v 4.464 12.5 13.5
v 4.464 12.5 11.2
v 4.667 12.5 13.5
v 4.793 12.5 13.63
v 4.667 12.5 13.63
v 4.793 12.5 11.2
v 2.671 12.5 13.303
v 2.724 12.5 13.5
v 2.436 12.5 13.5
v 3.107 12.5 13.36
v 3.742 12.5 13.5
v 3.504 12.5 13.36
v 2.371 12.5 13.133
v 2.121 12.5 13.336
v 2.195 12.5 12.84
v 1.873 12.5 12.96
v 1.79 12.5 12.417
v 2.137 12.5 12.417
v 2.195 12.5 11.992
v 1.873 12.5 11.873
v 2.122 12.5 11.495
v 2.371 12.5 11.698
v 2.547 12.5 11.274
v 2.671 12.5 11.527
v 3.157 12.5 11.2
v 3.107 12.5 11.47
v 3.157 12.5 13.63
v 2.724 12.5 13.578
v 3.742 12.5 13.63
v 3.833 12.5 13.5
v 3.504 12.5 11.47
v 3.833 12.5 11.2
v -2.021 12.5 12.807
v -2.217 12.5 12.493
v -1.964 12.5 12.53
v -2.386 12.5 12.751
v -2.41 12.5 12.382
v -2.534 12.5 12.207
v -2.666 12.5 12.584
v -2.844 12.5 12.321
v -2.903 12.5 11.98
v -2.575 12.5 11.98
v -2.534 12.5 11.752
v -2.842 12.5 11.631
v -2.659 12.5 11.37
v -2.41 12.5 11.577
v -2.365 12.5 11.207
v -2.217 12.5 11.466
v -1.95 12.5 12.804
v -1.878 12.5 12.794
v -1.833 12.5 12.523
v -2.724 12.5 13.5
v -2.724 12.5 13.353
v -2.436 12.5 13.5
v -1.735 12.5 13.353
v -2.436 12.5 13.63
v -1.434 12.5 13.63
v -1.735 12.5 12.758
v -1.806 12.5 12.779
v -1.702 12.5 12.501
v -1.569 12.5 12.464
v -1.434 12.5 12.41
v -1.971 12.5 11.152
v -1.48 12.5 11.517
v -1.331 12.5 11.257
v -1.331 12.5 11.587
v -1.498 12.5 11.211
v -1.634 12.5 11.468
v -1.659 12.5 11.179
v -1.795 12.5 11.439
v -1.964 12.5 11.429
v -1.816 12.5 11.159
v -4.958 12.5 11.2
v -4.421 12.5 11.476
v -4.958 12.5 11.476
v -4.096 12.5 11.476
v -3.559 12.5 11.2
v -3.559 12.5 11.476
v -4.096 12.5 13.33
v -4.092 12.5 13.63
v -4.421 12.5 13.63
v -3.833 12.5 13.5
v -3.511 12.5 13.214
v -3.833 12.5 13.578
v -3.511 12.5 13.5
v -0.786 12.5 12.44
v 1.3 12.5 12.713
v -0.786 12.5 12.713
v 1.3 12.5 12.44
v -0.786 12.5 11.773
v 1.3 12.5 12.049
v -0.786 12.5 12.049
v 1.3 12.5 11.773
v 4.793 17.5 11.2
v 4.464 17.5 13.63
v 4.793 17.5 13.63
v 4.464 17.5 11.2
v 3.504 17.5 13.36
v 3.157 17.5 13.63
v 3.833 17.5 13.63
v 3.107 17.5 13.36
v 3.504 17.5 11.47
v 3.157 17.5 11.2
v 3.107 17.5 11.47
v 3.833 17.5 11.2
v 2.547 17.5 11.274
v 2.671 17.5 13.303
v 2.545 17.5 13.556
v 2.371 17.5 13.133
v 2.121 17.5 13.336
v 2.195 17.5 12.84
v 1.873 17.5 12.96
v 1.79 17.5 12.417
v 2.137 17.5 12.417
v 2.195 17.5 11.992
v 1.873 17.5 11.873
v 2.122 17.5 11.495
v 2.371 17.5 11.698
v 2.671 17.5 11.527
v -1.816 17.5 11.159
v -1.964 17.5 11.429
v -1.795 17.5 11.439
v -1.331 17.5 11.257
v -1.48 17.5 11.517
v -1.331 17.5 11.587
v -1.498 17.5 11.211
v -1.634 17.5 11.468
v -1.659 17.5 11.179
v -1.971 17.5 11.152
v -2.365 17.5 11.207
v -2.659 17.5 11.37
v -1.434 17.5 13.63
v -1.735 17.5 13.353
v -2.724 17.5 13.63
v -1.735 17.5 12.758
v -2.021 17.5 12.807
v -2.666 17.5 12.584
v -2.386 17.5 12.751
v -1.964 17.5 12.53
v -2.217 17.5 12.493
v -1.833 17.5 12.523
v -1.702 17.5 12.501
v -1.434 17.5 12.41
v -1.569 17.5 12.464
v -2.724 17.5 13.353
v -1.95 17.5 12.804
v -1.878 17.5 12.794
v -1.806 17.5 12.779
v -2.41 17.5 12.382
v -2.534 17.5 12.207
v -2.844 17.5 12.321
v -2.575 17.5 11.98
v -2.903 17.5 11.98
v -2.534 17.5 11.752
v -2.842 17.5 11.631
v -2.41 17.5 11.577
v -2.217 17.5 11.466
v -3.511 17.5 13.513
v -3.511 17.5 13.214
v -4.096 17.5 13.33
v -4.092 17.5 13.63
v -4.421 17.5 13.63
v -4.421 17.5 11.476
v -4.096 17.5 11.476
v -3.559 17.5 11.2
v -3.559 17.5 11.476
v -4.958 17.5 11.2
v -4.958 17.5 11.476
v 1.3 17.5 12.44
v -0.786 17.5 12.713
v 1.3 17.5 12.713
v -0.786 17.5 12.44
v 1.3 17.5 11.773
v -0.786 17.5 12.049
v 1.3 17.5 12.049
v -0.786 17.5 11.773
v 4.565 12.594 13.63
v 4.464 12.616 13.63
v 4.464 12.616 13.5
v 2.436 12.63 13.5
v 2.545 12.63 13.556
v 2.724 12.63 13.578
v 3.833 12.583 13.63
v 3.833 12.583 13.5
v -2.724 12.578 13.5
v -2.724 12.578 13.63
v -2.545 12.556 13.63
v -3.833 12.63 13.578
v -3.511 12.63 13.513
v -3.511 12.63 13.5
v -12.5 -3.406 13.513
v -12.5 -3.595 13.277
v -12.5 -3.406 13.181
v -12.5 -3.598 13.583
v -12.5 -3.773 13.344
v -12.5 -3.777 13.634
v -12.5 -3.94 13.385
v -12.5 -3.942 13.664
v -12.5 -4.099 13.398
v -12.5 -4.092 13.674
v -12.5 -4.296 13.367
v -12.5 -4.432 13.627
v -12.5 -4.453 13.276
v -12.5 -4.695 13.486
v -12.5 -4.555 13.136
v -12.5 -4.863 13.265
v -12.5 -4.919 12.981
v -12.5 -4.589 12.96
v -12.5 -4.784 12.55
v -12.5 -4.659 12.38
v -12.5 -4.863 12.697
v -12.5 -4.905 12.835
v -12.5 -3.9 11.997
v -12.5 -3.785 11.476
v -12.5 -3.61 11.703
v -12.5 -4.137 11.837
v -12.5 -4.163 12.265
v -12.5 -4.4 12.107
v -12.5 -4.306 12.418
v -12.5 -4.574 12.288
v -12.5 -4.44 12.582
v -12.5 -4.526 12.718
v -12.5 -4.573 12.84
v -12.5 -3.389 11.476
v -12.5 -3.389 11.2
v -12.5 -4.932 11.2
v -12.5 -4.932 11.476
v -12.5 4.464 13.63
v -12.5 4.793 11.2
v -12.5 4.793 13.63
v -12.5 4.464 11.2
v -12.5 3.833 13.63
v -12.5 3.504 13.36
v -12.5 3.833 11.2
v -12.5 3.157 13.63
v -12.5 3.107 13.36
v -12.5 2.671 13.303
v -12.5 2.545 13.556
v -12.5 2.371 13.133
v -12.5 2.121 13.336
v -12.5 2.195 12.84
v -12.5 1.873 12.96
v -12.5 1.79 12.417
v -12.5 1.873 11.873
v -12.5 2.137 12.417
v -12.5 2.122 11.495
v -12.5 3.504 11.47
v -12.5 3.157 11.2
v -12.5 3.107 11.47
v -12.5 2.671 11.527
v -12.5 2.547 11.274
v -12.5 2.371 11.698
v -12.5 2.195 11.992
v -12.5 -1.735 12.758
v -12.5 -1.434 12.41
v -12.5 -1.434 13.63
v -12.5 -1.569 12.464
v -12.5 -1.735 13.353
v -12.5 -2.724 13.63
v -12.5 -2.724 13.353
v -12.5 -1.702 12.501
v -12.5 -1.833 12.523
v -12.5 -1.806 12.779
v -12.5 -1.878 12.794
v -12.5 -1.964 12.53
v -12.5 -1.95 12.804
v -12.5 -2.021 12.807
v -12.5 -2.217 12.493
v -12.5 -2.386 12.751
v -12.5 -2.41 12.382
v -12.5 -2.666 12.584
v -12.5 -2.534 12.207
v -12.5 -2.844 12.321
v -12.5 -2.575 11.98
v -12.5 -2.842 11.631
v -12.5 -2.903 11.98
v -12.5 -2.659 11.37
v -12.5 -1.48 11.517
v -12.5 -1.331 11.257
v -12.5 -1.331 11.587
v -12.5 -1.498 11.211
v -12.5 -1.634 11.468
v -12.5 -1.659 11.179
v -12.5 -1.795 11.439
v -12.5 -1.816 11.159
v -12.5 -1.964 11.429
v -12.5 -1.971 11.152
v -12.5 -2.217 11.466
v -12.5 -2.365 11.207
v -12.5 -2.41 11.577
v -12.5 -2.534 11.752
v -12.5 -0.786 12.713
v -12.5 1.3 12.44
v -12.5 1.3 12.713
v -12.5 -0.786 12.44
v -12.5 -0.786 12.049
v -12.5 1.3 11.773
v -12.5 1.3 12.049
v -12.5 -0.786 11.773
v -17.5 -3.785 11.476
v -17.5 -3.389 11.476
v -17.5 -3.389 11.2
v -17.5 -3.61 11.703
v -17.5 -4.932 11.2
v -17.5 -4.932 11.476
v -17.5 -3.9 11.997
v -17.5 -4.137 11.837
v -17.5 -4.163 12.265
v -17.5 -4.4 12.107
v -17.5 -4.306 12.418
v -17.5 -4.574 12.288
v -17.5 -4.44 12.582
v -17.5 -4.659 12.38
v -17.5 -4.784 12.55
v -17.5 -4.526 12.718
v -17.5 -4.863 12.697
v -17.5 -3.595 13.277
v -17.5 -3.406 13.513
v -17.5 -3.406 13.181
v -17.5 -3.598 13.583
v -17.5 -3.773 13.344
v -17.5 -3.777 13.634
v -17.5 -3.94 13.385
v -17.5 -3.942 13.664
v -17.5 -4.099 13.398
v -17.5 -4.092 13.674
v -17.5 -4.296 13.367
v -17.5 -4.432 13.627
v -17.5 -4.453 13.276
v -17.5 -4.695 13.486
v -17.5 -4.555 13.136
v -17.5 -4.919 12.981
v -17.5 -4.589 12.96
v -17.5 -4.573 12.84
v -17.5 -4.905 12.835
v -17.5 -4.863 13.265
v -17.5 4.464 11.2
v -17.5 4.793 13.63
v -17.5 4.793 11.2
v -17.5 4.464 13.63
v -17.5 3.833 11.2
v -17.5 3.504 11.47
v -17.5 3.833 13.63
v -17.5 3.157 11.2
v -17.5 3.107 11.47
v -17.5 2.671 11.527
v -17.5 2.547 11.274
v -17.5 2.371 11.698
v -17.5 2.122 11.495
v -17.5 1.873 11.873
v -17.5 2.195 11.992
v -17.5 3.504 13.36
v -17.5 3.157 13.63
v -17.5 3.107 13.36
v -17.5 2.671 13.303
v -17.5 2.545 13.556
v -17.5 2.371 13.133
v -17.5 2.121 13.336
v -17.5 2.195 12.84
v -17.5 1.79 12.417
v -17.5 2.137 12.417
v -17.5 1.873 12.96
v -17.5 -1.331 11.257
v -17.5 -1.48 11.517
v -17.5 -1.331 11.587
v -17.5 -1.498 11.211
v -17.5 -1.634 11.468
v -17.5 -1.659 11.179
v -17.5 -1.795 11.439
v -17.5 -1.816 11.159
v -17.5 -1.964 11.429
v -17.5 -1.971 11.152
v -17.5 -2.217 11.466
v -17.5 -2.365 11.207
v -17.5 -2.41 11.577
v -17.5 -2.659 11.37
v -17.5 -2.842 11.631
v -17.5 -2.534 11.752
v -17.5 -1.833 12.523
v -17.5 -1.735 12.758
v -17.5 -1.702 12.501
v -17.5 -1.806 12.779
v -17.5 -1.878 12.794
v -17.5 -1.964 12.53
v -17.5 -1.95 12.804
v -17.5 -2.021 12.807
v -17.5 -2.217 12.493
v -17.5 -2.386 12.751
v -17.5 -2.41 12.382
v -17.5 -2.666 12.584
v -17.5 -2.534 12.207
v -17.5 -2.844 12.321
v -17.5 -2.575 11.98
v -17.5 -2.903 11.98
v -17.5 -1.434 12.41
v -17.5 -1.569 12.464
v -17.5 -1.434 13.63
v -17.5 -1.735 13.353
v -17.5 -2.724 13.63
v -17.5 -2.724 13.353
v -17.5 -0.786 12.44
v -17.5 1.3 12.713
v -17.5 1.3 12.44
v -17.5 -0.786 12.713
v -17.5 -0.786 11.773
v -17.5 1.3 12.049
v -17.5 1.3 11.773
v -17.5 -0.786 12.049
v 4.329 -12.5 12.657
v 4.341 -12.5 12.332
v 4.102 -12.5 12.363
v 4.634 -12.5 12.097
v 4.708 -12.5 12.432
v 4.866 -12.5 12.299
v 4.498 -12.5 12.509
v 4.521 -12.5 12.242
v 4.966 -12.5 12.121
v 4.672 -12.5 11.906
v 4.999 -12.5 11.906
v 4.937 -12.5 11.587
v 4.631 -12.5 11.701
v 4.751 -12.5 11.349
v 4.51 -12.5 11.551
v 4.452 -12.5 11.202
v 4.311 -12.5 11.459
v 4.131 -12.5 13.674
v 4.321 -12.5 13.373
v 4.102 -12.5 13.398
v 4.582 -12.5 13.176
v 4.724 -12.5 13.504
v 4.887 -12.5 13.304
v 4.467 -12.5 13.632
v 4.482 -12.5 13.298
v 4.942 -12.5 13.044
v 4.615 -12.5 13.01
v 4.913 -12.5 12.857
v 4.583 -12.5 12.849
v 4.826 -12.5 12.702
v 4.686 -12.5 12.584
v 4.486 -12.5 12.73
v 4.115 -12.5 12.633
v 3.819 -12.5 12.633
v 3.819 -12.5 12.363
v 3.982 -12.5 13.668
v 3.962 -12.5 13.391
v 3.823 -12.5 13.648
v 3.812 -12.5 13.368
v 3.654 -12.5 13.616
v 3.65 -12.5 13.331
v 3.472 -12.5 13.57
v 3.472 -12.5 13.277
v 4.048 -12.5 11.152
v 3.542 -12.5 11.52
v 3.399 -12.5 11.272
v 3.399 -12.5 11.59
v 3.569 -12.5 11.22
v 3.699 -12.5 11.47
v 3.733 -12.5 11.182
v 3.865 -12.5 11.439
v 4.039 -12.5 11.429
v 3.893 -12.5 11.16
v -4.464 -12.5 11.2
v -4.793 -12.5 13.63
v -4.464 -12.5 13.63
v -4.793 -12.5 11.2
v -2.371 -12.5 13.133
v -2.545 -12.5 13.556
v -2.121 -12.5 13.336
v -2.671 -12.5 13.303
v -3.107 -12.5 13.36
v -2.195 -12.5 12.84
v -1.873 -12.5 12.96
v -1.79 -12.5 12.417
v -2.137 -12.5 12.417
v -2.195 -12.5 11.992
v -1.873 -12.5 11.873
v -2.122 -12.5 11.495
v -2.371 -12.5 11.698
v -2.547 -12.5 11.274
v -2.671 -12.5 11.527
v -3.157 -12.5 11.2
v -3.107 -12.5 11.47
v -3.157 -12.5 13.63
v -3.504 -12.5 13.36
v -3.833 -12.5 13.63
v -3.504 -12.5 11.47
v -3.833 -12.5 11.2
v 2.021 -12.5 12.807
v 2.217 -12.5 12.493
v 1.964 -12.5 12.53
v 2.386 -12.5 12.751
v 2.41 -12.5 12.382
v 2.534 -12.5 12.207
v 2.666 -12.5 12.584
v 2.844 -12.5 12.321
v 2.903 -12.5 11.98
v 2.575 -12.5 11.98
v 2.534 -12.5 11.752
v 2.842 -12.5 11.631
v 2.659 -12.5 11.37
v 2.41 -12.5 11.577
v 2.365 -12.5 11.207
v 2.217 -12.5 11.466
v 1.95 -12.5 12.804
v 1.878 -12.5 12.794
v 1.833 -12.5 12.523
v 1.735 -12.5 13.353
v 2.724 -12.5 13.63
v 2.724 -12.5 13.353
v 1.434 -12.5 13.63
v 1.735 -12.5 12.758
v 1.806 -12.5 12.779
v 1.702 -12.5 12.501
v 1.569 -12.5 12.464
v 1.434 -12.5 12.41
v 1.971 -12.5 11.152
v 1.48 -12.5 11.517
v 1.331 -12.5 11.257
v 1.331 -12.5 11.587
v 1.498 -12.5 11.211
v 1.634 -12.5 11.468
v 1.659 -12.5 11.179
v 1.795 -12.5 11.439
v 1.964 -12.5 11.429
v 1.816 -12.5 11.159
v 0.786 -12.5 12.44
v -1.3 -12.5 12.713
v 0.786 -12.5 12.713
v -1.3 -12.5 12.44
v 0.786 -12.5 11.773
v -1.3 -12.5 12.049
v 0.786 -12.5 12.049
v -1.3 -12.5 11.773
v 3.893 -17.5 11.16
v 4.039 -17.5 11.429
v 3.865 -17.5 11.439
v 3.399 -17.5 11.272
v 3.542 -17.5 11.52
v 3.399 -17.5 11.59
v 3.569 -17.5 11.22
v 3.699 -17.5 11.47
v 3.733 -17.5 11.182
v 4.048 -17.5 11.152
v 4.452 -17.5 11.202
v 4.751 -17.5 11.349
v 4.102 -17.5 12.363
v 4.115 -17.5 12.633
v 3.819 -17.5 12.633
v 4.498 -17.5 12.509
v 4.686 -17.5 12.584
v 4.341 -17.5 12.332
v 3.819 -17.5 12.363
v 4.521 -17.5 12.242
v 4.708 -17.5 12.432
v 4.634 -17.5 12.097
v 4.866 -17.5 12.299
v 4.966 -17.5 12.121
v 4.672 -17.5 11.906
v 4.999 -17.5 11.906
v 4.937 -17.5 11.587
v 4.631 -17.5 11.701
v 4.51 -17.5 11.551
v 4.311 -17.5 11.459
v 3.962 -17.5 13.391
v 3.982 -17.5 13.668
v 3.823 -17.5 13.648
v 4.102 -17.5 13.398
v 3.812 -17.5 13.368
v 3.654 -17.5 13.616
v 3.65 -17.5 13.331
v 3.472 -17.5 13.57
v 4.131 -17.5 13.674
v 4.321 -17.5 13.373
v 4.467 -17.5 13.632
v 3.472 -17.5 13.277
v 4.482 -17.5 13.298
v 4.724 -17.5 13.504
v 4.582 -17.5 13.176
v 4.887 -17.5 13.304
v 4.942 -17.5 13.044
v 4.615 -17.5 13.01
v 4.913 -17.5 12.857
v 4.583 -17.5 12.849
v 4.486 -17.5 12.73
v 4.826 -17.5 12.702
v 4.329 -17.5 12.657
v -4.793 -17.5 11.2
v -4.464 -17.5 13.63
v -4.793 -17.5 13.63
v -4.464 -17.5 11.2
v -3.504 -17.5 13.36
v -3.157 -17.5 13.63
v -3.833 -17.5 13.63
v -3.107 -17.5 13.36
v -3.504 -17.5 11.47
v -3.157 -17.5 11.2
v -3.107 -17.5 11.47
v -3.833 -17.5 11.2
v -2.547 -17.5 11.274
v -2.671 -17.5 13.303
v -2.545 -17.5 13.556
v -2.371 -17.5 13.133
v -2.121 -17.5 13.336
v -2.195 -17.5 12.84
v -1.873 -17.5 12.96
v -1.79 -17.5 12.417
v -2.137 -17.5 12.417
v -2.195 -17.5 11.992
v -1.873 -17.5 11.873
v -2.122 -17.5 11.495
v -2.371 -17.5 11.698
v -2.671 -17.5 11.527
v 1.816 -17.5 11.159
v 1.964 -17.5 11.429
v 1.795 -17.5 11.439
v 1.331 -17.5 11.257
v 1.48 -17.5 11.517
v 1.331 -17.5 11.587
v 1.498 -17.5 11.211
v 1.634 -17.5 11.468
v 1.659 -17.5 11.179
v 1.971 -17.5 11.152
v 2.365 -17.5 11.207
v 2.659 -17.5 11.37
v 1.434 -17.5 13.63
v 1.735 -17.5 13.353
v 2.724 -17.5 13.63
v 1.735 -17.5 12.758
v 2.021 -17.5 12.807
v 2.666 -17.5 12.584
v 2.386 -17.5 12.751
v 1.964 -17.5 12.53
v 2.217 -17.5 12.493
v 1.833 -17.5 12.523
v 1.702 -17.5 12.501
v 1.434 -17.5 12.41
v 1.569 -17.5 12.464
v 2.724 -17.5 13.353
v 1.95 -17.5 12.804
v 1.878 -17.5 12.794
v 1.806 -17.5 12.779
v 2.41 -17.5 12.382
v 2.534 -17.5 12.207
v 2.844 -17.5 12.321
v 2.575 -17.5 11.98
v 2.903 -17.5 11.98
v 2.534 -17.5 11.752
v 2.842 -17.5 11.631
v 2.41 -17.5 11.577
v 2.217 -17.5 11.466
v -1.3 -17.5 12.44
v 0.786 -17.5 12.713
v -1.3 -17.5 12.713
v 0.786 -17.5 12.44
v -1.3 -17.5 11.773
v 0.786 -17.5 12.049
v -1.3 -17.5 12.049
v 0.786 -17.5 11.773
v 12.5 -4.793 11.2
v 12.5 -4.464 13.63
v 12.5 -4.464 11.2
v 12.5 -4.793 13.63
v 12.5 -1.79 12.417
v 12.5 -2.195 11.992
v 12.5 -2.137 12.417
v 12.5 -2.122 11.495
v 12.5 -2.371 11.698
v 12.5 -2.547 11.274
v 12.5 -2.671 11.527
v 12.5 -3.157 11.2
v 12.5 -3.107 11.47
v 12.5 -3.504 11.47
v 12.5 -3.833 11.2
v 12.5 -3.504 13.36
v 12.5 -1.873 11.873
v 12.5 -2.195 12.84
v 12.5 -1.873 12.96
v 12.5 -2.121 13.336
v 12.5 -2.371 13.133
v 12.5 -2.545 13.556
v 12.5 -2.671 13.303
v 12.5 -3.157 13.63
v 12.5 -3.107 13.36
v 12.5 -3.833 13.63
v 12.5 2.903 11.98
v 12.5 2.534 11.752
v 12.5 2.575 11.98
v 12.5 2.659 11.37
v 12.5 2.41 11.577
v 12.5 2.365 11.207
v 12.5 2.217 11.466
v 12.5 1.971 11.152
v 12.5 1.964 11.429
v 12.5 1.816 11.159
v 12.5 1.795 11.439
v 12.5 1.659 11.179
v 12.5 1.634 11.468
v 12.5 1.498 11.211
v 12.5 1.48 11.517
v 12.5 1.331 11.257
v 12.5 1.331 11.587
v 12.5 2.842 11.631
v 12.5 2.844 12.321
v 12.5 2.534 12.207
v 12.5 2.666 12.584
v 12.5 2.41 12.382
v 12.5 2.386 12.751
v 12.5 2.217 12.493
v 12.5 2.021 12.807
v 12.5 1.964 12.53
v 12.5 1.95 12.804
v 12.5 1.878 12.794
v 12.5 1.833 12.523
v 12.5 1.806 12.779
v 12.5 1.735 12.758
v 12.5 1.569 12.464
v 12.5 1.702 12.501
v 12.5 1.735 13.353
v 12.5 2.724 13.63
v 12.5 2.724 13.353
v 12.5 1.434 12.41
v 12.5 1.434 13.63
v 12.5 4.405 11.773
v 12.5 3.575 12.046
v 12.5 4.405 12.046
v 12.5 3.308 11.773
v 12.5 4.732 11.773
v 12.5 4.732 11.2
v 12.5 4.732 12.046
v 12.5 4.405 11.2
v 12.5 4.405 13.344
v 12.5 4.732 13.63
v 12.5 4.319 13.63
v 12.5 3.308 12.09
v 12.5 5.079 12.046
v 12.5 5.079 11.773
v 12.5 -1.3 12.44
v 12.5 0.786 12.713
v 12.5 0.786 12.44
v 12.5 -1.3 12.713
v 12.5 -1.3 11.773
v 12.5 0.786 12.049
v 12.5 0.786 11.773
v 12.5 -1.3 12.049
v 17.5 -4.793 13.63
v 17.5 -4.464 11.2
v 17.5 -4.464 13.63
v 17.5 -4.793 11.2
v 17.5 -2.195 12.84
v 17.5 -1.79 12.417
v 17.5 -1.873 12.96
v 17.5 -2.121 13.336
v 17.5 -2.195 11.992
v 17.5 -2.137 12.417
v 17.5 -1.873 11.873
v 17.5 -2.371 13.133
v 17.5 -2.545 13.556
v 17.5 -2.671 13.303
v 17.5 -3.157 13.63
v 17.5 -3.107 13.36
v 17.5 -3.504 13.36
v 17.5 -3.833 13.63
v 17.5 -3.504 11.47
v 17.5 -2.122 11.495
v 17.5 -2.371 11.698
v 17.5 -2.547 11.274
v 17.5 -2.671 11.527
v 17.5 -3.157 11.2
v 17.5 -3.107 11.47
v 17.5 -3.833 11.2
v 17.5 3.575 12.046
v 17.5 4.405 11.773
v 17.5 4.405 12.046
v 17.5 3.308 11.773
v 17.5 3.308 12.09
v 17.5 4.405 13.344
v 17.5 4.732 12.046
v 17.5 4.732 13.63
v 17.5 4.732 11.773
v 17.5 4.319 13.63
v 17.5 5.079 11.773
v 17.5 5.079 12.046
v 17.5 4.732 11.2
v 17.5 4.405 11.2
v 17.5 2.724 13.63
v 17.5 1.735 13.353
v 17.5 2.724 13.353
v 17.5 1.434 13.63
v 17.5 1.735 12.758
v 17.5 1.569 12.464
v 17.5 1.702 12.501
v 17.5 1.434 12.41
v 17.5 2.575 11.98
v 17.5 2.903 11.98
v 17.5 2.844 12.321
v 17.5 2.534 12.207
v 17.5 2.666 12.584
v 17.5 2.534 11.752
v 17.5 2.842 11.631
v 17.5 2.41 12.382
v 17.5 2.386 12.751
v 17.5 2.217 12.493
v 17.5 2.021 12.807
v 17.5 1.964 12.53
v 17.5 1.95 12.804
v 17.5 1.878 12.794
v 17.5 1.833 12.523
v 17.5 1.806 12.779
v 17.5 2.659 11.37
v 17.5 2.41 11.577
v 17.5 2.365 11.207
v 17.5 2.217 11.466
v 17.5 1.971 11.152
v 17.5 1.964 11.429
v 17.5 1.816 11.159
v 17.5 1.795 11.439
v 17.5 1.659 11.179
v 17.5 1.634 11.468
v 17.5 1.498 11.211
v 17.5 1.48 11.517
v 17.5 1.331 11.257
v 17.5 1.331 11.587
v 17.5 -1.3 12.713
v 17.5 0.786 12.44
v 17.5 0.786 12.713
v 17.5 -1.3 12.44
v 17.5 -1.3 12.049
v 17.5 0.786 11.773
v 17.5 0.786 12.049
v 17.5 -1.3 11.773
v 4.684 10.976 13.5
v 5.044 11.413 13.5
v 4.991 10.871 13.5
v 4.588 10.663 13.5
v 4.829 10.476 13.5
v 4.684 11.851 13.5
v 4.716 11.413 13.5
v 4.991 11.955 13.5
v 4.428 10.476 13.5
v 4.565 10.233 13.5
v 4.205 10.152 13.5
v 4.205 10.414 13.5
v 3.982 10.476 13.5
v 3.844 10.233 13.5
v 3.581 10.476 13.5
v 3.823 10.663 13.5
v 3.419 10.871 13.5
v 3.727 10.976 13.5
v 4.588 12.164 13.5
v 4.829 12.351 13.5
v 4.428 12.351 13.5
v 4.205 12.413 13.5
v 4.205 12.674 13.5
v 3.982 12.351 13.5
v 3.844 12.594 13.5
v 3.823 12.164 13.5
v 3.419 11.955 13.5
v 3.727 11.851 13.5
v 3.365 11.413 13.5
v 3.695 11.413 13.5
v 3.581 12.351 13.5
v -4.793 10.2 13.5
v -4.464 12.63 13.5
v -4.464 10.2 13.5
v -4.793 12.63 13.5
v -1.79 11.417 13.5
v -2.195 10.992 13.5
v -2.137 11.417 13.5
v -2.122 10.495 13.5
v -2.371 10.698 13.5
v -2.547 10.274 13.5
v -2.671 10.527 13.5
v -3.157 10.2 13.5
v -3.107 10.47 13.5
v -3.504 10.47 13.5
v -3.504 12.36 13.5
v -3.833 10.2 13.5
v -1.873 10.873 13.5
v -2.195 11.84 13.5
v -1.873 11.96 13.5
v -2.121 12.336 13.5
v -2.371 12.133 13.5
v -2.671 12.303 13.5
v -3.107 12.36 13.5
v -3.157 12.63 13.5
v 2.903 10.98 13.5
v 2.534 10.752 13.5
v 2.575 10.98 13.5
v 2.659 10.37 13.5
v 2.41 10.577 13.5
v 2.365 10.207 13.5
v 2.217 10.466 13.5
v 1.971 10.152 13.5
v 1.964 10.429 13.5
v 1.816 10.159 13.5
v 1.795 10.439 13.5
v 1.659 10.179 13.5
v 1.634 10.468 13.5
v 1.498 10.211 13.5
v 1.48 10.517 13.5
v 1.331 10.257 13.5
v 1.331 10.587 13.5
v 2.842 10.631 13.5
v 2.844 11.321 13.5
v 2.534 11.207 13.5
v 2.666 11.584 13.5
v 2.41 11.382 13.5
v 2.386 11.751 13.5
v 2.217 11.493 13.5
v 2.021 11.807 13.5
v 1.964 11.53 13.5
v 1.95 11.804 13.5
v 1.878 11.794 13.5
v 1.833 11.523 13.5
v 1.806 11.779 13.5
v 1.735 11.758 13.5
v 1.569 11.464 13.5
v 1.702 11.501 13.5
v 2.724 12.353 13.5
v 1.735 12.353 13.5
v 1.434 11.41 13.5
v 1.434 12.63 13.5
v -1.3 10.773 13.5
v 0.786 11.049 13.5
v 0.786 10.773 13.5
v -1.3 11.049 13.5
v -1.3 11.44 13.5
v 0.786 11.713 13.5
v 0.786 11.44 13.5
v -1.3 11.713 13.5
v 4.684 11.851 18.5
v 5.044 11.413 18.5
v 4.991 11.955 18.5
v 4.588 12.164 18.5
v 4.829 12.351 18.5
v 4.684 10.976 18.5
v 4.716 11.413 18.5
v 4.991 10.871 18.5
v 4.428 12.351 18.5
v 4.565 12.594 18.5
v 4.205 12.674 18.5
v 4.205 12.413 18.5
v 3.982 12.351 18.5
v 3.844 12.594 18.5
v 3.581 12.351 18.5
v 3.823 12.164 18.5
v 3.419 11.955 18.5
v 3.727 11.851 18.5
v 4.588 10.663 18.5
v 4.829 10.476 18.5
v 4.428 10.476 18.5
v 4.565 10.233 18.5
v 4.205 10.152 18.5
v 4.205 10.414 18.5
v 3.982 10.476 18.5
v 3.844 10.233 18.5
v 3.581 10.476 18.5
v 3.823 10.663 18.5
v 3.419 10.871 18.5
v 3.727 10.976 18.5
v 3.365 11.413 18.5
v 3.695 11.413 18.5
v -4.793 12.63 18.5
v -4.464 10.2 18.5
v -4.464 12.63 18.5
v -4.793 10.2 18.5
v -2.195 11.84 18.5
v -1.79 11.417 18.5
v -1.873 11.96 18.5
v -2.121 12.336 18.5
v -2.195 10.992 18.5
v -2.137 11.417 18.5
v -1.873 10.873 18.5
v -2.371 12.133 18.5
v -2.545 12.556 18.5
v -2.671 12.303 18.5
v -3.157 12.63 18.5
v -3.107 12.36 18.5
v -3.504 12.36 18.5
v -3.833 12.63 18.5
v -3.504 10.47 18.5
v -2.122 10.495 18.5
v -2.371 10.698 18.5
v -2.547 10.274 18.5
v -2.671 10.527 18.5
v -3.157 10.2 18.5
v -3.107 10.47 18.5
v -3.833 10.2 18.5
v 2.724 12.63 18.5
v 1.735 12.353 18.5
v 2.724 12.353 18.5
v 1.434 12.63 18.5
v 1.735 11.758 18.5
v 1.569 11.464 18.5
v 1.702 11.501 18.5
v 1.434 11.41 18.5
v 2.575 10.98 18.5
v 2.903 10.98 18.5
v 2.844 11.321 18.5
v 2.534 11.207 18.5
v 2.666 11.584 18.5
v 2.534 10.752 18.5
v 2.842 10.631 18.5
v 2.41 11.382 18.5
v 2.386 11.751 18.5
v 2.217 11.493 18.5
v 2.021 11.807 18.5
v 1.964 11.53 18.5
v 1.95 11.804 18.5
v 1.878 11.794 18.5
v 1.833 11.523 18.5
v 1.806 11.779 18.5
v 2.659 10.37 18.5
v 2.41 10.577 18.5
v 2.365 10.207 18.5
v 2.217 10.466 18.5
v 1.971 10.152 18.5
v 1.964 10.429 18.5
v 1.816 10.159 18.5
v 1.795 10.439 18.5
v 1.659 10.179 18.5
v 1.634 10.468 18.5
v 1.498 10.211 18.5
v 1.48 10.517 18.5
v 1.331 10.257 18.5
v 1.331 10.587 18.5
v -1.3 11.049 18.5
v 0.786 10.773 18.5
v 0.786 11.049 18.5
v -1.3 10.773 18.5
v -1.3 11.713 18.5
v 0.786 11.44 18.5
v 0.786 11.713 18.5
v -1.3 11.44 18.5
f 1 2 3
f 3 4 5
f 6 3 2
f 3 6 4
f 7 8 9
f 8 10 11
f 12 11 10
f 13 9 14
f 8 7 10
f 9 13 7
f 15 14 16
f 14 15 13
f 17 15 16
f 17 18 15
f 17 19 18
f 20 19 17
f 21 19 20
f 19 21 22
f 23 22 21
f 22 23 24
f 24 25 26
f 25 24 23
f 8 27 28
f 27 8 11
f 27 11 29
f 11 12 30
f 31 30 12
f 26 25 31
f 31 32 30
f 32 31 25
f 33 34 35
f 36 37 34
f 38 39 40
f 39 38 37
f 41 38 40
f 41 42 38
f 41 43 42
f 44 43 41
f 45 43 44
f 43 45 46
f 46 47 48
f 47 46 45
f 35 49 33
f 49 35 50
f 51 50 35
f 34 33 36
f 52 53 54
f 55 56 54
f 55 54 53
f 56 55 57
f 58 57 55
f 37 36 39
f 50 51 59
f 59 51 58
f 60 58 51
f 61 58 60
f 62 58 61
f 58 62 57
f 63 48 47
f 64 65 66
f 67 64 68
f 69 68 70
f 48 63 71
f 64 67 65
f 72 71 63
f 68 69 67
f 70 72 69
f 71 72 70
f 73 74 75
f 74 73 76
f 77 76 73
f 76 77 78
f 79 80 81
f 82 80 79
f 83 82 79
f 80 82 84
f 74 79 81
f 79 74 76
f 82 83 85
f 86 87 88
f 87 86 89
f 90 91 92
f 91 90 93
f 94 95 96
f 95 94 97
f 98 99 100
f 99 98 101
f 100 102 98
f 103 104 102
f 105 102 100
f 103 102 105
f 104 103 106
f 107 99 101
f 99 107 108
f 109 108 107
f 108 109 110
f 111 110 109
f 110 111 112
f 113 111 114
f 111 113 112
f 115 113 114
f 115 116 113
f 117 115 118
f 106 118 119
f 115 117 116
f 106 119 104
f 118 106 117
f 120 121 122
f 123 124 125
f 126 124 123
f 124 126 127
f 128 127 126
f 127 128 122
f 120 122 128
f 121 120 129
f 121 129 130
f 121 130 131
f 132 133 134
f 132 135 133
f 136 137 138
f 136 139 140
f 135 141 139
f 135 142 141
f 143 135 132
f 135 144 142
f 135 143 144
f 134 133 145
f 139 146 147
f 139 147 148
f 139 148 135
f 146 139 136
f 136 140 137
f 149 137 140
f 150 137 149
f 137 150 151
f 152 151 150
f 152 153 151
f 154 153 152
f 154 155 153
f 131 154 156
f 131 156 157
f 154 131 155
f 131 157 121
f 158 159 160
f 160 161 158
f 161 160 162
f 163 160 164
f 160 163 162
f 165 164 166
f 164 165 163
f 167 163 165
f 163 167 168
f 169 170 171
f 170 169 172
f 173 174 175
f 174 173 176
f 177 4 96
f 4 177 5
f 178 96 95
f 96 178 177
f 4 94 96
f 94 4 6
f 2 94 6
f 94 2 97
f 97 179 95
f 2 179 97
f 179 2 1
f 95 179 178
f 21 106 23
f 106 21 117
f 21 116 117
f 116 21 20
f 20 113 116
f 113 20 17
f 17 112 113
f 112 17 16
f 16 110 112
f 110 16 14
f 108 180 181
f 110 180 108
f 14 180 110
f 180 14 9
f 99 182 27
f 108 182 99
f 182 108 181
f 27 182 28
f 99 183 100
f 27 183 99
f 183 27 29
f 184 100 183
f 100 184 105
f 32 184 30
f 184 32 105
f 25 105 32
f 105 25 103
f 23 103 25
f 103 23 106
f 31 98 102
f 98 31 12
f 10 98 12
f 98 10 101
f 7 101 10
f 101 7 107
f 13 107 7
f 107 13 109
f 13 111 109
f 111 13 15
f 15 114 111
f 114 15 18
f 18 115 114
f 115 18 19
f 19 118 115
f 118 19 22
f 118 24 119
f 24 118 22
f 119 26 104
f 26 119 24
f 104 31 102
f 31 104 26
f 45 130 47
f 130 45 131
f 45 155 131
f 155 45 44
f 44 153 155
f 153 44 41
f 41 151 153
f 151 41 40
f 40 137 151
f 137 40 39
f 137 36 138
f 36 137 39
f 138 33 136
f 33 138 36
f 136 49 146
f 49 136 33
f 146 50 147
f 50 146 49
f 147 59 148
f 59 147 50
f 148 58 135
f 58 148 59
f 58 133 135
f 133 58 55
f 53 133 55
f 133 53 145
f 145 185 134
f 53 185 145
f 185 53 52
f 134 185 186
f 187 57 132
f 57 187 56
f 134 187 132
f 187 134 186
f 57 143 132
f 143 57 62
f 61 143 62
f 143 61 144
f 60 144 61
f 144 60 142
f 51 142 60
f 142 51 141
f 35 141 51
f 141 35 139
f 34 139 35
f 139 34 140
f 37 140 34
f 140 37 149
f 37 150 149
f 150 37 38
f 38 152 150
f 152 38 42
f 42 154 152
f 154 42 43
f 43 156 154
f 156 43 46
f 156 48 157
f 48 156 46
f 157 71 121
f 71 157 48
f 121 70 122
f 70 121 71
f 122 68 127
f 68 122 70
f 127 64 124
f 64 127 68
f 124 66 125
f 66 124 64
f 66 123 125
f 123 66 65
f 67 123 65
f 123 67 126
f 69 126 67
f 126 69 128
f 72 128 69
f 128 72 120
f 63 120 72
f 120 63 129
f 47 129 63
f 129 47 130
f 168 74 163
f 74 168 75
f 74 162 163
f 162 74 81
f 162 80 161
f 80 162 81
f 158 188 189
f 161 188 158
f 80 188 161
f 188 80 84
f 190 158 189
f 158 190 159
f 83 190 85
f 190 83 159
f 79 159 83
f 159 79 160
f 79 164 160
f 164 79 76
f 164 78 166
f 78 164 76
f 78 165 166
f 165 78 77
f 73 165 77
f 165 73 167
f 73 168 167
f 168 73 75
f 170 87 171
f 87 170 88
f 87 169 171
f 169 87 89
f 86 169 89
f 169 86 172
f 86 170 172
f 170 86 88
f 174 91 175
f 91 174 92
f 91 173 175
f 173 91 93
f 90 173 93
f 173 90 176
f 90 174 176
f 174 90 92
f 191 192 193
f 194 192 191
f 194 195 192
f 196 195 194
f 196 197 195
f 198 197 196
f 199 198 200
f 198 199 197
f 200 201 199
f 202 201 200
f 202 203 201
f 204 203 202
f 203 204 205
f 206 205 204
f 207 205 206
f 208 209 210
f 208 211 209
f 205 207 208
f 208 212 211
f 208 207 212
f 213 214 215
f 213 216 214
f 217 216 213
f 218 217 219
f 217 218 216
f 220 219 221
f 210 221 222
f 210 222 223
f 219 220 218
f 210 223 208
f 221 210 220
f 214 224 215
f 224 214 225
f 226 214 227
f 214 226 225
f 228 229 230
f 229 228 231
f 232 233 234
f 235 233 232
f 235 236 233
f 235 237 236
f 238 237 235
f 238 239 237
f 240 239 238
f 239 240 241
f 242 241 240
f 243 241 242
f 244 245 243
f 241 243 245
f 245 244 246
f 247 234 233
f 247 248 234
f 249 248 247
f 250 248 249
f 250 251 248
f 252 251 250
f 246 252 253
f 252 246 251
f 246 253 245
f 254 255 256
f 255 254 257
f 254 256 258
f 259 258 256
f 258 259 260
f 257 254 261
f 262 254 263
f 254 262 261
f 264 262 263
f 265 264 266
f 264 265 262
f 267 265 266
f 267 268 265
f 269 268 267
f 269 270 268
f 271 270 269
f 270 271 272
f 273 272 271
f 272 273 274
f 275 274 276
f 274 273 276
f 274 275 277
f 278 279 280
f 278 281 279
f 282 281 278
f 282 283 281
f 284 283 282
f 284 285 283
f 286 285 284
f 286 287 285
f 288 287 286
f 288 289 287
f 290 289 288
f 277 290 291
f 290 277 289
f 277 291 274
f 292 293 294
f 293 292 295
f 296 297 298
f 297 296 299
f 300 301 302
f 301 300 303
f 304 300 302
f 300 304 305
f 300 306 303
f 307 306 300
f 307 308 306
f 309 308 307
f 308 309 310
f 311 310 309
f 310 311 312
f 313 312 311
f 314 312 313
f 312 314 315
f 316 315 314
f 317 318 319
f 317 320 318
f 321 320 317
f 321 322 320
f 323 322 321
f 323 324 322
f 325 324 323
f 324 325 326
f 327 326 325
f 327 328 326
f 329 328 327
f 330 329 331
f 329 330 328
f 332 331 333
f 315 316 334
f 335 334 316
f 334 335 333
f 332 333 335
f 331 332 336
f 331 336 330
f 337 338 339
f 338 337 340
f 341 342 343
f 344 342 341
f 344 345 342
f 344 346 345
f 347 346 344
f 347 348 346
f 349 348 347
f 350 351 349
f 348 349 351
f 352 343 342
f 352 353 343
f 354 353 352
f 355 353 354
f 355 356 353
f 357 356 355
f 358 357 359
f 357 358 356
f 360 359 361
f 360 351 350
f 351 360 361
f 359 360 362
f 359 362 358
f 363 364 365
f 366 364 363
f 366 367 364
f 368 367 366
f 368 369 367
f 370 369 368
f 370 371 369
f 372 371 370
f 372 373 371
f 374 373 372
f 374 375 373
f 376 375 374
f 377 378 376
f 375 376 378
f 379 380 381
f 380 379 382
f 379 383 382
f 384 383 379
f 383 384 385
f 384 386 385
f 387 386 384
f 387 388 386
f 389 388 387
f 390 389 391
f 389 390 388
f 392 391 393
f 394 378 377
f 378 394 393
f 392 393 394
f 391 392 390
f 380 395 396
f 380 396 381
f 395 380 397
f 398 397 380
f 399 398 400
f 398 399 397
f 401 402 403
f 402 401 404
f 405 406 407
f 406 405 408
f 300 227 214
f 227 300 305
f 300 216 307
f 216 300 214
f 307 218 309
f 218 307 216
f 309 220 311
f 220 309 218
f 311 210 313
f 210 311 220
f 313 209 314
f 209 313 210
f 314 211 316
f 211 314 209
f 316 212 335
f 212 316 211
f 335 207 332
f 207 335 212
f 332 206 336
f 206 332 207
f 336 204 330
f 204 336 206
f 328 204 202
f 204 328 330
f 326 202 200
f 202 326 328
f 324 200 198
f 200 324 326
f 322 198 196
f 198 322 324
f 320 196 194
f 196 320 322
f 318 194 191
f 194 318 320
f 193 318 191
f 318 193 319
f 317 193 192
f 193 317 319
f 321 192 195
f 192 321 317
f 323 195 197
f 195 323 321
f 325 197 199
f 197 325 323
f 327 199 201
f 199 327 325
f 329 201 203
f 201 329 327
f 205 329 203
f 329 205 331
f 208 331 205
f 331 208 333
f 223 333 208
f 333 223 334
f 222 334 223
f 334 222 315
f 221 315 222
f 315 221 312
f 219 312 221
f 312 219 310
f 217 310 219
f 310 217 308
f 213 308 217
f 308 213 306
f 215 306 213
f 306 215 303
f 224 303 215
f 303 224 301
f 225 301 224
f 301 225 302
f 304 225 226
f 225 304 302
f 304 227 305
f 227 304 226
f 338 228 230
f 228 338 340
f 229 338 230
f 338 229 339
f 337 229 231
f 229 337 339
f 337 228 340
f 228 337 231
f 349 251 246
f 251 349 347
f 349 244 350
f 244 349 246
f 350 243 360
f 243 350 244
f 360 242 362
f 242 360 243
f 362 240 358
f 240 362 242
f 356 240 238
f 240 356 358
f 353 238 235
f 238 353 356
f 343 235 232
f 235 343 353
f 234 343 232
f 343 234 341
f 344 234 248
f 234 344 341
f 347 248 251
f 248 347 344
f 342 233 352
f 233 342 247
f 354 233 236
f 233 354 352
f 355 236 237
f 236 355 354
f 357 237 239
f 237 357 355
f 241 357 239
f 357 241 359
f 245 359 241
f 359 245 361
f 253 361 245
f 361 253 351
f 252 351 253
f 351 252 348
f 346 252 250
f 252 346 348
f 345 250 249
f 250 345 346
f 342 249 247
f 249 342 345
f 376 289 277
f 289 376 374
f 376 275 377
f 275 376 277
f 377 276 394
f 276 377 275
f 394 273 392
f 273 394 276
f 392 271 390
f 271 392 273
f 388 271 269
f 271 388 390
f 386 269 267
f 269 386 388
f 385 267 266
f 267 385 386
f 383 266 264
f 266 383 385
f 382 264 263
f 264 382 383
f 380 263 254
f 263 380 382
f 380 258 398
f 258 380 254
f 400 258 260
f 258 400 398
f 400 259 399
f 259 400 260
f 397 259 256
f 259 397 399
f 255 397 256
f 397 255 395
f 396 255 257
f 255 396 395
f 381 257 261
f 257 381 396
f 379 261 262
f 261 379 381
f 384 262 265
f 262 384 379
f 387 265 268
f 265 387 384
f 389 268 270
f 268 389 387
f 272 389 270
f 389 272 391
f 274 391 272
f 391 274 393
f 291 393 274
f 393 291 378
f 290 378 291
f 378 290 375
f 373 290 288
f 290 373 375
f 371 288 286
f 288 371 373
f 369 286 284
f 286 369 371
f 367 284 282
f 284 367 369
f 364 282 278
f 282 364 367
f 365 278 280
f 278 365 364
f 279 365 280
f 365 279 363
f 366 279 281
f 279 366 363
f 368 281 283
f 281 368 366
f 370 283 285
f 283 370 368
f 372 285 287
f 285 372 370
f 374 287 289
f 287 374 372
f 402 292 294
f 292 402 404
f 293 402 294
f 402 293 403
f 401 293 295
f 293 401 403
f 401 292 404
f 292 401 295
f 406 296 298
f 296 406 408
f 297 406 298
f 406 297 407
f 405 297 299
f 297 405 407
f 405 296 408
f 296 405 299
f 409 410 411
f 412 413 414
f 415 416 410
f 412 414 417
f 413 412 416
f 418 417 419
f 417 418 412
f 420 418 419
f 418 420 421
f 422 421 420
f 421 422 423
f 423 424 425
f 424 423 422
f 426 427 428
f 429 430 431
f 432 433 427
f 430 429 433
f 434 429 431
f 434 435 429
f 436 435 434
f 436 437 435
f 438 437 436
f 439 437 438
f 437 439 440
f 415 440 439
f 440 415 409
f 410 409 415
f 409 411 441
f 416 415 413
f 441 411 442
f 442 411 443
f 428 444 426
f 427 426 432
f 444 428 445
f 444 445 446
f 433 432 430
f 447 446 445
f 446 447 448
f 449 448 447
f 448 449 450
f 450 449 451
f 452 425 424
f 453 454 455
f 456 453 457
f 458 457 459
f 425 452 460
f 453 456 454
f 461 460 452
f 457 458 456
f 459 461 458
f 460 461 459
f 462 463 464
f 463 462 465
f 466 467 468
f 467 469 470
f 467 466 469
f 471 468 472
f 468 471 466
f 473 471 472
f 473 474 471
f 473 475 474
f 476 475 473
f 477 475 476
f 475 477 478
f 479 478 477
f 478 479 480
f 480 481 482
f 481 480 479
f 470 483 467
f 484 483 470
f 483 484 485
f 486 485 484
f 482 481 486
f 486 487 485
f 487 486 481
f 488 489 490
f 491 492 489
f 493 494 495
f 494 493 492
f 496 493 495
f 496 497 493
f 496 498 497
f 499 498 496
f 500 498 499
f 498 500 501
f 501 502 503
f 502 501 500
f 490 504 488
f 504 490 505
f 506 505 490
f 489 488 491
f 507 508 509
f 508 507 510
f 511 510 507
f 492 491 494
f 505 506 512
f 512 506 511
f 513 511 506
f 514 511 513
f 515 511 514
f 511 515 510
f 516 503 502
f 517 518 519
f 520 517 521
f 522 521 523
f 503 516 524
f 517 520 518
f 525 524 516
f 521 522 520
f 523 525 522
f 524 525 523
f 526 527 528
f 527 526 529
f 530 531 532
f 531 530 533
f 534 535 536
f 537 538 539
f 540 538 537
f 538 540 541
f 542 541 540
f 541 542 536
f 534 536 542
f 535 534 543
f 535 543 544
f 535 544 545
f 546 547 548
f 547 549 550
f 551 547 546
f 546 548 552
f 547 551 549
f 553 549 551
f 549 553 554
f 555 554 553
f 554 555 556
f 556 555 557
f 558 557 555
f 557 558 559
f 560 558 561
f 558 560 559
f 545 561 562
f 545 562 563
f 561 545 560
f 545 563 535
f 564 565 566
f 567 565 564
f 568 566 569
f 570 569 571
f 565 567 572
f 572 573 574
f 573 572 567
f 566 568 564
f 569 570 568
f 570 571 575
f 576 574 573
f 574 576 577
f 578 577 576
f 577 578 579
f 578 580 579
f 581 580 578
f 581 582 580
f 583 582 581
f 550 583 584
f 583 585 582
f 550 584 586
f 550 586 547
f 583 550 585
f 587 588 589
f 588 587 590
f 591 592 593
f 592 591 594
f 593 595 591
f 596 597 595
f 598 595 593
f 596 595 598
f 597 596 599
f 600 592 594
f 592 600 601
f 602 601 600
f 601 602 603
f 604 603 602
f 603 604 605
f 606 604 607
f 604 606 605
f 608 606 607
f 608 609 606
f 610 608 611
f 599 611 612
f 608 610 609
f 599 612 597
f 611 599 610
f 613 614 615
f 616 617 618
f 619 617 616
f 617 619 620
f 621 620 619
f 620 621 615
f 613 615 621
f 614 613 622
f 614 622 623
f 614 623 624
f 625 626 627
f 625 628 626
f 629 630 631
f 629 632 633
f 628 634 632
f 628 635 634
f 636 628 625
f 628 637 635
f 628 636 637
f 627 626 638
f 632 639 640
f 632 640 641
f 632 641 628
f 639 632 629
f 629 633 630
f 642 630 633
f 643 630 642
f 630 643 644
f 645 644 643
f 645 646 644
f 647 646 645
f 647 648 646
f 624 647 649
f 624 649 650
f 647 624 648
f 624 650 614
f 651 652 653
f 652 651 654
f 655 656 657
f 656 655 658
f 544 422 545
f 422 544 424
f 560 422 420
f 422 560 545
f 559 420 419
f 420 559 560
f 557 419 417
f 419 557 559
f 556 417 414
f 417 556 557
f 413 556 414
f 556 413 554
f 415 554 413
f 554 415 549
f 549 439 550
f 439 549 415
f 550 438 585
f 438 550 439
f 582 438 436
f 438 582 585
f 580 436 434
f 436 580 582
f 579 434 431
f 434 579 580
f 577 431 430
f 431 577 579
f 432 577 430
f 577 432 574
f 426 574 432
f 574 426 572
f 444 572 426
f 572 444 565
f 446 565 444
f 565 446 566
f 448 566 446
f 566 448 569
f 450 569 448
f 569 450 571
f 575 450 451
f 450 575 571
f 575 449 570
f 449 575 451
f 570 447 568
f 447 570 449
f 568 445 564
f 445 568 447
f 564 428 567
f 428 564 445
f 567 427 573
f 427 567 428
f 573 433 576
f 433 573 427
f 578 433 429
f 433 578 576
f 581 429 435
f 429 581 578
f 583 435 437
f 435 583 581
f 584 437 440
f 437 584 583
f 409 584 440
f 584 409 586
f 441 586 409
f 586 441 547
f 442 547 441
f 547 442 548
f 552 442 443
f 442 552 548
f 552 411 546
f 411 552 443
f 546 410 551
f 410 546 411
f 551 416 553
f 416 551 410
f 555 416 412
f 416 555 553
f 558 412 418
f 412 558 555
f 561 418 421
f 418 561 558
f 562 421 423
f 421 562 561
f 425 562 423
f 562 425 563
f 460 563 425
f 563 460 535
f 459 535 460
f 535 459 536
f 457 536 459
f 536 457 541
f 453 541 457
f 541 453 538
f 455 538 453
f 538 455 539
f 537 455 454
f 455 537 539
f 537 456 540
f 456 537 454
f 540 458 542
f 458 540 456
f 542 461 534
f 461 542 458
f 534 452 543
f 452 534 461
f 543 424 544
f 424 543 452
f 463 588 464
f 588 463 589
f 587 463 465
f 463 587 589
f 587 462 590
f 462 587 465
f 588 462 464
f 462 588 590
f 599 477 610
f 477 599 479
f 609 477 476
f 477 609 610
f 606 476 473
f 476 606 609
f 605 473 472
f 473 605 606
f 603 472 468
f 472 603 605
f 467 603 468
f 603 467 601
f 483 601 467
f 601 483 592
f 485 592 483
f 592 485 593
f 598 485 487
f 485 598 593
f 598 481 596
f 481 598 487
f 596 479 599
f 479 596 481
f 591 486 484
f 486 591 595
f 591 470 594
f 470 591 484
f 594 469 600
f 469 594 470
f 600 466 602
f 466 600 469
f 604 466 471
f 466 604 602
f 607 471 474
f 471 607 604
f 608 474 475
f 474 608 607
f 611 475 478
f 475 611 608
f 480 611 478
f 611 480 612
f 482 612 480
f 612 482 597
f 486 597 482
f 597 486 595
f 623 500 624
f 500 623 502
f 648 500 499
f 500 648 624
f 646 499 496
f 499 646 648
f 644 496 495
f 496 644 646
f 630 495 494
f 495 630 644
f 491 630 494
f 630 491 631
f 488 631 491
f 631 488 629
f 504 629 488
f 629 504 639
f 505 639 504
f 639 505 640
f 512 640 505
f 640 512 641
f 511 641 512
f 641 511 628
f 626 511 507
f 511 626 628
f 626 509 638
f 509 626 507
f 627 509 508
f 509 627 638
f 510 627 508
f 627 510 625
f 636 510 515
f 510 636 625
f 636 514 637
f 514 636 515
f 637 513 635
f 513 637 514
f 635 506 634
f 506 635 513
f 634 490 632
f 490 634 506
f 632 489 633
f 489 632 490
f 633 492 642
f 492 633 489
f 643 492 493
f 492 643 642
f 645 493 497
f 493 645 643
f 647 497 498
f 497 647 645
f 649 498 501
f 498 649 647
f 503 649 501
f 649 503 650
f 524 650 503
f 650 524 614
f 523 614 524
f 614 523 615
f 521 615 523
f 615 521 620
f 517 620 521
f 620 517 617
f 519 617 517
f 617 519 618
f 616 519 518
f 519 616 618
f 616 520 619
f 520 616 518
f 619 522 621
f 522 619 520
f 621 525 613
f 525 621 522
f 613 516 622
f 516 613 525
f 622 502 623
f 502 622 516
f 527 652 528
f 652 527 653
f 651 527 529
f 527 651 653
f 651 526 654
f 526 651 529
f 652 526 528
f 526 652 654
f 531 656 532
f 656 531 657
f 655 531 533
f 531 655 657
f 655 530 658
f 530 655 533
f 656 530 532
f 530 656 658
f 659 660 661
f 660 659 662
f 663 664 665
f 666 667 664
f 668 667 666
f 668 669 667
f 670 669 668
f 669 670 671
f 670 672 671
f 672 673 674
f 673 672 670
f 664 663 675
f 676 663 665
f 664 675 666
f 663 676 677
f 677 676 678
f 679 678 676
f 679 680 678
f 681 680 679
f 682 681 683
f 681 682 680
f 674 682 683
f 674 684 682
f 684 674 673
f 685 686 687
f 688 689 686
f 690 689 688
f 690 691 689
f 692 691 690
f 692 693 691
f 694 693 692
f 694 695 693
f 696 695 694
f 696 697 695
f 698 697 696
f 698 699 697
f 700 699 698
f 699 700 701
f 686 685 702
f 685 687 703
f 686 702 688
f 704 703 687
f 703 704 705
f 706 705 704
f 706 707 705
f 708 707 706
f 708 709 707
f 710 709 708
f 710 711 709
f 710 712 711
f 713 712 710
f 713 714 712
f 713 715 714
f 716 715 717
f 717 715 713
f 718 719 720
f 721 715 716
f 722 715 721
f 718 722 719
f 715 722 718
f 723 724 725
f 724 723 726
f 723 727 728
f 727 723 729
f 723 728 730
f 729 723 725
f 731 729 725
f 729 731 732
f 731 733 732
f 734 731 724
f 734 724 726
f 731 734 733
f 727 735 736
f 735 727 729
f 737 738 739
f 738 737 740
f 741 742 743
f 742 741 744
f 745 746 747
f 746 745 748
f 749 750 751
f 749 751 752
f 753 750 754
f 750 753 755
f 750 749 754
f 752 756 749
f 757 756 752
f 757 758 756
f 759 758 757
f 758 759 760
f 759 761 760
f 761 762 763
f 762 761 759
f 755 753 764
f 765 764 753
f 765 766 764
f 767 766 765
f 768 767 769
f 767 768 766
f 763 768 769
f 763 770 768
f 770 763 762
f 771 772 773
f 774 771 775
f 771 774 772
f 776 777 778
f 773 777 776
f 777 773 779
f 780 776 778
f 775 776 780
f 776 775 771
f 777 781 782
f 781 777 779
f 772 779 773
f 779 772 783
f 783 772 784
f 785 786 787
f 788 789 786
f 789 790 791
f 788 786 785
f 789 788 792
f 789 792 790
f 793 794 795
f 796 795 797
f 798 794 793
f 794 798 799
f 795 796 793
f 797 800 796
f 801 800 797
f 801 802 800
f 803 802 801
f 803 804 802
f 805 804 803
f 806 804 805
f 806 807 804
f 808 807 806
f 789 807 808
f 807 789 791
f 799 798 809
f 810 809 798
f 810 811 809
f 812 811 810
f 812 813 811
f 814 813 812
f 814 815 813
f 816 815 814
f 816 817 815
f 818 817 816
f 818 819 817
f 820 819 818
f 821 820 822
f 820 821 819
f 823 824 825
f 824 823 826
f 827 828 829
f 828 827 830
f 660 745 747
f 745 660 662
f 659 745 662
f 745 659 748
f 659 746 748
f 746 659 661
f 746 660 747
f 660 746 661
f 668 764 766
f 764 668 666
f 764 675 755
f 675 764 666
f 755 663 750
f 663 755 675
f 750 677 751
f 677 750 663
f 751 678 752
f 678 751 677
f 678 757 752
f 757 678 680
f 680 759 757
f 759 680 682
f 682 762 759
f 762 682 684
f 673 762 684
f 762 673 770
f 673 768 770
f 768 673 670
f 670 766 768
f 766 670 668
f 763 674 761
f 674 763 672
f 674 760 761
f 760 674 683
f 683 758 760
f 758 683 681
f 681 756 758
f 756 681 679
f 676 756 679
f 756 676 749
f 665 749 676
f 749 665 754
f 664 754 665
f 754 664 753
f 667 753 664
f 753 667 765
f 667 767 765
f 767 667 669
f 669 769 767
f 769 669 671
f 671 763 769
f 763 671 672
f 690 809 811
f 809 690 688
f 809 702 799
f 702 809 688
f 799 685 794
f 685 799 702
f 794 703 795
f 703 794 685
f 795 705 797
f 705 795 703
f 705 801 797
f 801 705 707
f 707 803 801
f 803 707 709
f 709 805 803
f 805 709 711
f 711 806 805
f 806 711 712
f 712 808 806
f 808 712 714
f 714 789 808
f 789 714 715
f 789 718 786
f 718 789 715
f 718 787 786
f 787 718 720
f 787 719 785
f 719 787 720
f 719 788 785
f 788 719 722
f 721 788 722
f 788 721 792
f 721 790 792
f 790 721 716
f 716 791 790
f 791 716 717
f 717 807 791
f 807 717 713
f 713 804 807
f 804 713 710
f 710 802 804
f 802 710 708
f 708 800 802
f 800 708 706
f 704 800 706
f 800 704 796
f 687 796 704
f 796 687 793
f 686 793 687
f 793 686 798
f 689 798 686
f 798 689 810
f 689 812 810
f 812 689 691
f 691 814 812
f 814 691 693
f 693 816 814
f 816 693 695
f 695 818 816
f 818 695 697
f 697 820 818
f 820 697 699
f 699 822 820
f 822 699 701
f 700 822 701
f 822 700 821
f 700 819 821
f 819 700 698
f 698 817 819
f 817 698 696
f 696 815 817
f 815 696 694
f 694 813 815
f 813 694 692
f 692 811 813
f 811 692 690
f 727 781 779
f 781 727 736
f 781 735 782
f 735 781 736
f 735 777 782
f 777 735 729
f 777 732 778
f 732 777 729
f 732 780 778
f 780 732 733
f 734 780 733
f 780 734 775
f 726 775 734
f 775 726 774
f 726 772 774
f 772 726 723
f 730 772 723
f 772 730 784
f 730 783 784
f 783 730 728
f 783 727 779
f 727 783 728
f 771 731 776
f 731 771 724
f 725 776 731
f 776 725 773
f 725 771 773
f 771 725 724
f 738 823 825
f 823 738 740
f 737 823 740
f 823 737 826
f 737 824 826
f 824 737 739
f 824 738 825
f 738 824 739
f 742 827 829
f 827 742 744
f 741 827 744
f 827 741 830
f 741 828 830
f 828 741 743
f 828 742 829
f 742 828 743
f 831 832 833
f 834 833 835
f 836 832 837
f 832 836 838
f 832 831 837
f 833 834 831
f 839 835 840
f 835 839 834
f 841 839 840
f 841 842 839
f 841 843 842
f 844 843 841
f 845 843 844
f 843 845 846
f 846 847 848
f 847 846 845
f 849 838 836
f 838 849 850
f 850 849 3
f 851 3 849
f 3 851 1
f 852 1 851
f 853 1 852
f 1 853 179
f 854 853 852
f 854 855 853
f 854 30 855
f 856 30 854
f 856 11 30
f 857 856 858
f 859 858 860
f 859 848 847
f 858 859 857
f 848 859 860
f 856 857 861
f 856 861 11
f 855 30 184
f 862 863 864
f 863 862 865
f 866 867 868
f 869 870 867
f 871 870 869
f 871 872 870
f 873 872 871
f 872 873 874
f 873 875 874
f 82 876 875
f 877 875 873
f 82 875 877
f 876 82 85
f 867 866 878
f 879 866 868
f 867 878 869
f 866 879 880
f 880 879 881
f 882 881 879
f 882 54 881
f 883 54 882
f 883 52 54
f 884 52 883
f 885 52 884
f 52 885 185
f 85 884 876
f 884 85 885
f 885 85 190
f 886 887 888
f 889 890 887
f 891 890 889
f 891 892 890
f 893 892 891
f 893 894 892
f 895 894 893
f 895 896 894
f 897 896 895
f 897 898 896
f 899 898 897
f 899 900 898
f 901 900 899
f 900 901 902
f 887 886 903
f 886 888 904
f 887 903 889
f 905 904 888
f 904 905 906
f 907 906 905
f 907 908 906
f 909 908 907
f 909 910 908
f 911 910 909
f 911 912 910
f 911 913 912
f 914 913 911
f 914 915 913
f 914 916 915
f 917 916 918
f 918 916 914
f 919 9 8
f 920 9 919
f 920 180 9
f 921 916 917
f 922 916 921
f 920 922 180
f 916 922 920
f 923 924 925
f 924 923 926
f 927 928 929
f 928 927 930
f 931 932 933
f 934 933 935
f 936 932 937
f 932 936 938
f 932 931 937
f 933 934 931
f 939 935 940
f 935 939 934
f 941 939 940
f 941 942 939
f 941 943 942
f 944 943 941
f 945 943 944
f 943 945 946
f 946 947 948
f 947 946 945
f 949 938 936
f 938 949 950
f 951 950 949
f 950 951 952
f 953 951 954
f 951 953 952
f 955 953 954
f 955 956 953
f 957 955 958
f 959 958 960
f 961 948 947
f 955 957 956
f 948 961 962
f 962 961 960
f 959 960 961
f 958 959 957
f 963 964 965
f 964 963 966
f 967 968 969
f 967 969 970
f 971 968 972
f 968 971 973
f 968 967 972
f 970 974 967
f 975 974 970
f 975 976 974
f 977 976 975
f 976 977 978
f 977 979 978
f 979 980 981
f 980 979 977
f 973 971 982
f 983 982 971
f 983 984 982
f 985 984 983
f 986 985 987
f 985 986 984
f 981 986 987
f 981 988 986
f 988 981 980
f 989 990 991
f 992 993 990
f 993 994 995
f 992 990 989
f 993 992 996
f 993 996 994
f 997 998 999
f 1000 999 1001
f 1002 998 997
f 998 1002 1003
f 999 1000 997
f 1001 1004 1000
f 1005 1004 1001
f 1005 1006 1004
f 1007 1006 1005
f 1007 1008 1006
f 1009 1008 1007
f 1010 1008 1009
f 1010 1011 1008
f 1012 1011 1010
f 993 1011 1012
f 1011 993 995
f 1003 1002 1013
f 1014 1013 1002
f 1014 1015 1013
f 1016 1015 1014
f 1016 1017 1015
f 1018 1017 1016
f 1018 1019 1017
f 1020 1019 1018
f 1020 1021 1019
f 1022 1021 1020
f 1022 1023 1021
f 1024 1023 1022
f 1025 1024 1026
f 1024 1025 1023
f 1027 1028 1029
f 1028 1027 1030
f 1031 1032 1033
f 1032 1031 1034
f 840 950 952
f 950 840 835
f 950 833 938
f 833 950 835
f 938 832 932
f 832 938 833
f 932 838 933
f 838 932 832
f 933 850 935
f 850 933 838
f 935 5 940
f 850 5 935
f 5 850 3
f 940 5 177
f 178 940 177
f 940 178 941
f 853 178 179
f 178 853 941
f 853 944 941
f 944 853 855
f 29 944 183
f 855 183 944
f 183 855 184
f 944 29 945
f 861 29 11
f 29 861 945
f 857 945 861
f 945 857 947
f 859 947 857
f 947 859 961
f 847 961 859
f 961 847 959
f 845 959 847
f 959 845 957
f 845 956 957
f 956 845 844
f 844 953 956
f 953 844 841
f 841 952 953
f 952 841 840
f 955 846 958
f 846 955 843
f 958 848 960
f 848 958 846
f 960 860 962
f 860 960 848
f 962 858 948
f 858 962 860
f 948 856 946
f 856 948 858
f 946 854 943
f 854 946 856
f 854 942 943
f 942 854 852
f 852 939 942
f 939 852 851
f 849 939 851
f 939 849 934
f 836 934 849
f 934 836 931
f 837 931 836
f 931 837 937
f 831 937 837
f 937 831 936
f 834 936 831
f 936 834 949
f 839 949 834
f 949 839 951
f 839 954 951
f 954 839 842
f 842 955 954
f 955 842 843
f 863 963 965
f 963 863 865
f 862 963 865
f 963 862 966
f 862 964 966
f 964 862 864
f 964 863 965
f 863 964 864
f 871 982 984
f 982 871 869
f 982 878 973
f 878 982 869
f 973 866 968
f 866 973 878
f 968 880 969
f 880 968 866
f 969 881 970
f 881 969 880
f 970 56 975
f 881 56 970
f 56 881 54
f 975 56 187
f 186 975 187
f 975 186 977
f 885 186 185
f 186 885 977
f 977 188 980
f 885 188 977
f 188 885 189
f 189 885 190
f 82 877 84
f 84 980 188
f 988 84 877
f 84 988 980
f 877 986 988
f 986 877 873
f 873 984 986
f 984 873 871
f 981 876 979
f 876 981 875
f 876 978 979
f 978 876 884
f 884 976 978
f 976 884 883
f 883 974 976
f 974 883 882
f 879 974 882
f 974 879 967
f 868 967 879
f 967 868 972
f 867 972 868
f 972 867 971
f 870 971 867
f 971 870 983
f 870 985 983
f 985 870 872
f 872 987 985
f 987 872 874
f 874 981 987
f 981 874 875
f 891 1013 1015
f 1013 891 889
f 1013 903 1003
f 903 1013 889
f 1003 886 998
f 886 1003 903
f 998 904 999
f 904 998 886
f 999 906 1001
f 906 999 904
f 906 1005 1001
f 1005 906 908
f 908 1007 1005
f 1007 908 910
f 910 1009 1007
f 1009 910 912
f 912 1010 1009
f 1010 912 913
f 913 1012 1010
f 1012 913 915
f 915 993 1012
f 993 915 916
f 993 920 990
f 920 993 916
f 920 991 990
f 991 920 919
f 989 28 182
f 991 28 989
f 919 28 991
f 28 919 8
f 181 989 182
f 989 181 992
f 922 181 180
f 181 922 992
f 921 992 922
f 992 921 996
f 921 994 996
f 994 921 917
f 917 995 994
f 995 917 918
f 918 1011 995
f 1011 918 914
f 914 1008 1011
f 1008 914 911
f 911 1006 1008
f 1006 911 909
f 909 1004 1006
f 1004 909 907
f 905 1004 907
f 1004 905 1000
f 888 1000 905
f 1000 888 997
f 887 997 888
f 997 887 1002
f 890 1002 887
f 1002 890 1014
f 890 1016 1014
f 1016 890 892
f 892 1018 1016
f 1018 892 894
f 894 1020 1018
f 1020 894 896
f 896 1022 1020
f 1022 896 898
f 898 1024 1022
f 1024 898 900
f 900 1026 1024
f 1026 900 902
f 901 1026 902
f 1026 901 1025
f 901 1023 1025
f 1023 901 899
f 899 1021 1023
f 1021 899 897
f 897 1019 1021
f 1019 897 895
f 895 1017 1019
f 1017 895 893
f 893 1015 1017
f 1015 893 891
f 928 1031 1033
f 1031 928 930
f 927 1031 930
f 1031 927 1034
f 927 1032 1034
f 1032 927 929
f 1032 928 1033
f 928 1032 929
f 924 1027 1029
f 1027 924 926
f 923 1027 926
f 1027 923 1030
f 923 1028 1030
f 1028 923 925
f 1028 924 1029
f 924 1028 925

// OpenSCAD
// file: modules.scad
offset = [0,8,0];
zoom = [0.8,0.8,1];

module white( filename, text)
{
    translate([0,4,0])   scale(zoom)
    rotate([180,0,-90]) 
    union(){ 
        translate([-14,-6.4,-2.5])   rotate([0,0,90])  linear_extrude(5)  text (text,font="bold",size=3); 
        intersection() 
        {    
            cube([35,35,5],center=true); 
            translate([1.5,0,2.6])   scale([0.14,0.14,-1])surface(file = filename, center = true); 
        } 
    } 

};

module black( filename, text)
{
    translate([0,4,0])   scale(zoom)
    rotate([180,0,-90]) 
    difference() 
    {    
        cube([35,35,5],center=true); 
        translate([1.5,0,2.6])    scale([0.14,0.14,-1]) surface(file = filename, center = true);
        translate([-14,-6.4,-2.5])   rotate([0,0,90])  linear_extrude(6)  text (text,font="bold",size=3);
    } 
}

module shape()
{
    translate([0,8,0])   scale(zoom) rotate([180,0,0]) 
    {
        rotate([0,0,90]) translate([5,0,0])  cube([35,35,5.5],center=true);  
        // use for help
//        linear_extrude(5)  translate([-9,-4,0])   text("B",size=20);
    }
}

module cube_appendix()
{
    difference()
    {
        union()
        {
            translate([0,0,1])
            {
                cube([35,35,35],center=true);
                 translate([0,0,7]) cylinder(r=10,h=30,center=true);
            }
        }
        translate([0,0,-24]) cylinder(r=10,h=30,center=true);
    }
}

module blue_stairs()
{
        union()
        {
            translate([0,0,1])cube([35,35,35],center=true);
            translate([0,0,-20.5])cube([35,35,9],center=true);            
            translate([-4.25,0,-29.5])cube([35-8.5,35,9],center=true);            
            translate([-8.5,0,-29.5-9])cube([35-17,35,9],center=true);            
            translate([-13,0,-29.5-17.5])cube([35-26,35,9],center=true);            

        }
}
// main file
include <modules.scad>

union()
{
    rotate([0,180,0])   translate([0,-5,-16])   white("../aruco/Marker50.png","ID=50");  
    rotate([90,0,0])
    {
        translate([0,-4,-15])                     white("../aruco/Marker51.png","ID=51");
        rotate([0,90,0])   translate([0,-4,-15])  white("../aruco/Marker52.png","ID=52");  
        rotate([0,180,0])   translate([0,-4,-15]) white("../aruco/Marker53.png","ID=53");
        rotate([0,270,0])   translate([0,-4,-15]) white("../aruco/Marker54.png","ID=54");
    }
}
